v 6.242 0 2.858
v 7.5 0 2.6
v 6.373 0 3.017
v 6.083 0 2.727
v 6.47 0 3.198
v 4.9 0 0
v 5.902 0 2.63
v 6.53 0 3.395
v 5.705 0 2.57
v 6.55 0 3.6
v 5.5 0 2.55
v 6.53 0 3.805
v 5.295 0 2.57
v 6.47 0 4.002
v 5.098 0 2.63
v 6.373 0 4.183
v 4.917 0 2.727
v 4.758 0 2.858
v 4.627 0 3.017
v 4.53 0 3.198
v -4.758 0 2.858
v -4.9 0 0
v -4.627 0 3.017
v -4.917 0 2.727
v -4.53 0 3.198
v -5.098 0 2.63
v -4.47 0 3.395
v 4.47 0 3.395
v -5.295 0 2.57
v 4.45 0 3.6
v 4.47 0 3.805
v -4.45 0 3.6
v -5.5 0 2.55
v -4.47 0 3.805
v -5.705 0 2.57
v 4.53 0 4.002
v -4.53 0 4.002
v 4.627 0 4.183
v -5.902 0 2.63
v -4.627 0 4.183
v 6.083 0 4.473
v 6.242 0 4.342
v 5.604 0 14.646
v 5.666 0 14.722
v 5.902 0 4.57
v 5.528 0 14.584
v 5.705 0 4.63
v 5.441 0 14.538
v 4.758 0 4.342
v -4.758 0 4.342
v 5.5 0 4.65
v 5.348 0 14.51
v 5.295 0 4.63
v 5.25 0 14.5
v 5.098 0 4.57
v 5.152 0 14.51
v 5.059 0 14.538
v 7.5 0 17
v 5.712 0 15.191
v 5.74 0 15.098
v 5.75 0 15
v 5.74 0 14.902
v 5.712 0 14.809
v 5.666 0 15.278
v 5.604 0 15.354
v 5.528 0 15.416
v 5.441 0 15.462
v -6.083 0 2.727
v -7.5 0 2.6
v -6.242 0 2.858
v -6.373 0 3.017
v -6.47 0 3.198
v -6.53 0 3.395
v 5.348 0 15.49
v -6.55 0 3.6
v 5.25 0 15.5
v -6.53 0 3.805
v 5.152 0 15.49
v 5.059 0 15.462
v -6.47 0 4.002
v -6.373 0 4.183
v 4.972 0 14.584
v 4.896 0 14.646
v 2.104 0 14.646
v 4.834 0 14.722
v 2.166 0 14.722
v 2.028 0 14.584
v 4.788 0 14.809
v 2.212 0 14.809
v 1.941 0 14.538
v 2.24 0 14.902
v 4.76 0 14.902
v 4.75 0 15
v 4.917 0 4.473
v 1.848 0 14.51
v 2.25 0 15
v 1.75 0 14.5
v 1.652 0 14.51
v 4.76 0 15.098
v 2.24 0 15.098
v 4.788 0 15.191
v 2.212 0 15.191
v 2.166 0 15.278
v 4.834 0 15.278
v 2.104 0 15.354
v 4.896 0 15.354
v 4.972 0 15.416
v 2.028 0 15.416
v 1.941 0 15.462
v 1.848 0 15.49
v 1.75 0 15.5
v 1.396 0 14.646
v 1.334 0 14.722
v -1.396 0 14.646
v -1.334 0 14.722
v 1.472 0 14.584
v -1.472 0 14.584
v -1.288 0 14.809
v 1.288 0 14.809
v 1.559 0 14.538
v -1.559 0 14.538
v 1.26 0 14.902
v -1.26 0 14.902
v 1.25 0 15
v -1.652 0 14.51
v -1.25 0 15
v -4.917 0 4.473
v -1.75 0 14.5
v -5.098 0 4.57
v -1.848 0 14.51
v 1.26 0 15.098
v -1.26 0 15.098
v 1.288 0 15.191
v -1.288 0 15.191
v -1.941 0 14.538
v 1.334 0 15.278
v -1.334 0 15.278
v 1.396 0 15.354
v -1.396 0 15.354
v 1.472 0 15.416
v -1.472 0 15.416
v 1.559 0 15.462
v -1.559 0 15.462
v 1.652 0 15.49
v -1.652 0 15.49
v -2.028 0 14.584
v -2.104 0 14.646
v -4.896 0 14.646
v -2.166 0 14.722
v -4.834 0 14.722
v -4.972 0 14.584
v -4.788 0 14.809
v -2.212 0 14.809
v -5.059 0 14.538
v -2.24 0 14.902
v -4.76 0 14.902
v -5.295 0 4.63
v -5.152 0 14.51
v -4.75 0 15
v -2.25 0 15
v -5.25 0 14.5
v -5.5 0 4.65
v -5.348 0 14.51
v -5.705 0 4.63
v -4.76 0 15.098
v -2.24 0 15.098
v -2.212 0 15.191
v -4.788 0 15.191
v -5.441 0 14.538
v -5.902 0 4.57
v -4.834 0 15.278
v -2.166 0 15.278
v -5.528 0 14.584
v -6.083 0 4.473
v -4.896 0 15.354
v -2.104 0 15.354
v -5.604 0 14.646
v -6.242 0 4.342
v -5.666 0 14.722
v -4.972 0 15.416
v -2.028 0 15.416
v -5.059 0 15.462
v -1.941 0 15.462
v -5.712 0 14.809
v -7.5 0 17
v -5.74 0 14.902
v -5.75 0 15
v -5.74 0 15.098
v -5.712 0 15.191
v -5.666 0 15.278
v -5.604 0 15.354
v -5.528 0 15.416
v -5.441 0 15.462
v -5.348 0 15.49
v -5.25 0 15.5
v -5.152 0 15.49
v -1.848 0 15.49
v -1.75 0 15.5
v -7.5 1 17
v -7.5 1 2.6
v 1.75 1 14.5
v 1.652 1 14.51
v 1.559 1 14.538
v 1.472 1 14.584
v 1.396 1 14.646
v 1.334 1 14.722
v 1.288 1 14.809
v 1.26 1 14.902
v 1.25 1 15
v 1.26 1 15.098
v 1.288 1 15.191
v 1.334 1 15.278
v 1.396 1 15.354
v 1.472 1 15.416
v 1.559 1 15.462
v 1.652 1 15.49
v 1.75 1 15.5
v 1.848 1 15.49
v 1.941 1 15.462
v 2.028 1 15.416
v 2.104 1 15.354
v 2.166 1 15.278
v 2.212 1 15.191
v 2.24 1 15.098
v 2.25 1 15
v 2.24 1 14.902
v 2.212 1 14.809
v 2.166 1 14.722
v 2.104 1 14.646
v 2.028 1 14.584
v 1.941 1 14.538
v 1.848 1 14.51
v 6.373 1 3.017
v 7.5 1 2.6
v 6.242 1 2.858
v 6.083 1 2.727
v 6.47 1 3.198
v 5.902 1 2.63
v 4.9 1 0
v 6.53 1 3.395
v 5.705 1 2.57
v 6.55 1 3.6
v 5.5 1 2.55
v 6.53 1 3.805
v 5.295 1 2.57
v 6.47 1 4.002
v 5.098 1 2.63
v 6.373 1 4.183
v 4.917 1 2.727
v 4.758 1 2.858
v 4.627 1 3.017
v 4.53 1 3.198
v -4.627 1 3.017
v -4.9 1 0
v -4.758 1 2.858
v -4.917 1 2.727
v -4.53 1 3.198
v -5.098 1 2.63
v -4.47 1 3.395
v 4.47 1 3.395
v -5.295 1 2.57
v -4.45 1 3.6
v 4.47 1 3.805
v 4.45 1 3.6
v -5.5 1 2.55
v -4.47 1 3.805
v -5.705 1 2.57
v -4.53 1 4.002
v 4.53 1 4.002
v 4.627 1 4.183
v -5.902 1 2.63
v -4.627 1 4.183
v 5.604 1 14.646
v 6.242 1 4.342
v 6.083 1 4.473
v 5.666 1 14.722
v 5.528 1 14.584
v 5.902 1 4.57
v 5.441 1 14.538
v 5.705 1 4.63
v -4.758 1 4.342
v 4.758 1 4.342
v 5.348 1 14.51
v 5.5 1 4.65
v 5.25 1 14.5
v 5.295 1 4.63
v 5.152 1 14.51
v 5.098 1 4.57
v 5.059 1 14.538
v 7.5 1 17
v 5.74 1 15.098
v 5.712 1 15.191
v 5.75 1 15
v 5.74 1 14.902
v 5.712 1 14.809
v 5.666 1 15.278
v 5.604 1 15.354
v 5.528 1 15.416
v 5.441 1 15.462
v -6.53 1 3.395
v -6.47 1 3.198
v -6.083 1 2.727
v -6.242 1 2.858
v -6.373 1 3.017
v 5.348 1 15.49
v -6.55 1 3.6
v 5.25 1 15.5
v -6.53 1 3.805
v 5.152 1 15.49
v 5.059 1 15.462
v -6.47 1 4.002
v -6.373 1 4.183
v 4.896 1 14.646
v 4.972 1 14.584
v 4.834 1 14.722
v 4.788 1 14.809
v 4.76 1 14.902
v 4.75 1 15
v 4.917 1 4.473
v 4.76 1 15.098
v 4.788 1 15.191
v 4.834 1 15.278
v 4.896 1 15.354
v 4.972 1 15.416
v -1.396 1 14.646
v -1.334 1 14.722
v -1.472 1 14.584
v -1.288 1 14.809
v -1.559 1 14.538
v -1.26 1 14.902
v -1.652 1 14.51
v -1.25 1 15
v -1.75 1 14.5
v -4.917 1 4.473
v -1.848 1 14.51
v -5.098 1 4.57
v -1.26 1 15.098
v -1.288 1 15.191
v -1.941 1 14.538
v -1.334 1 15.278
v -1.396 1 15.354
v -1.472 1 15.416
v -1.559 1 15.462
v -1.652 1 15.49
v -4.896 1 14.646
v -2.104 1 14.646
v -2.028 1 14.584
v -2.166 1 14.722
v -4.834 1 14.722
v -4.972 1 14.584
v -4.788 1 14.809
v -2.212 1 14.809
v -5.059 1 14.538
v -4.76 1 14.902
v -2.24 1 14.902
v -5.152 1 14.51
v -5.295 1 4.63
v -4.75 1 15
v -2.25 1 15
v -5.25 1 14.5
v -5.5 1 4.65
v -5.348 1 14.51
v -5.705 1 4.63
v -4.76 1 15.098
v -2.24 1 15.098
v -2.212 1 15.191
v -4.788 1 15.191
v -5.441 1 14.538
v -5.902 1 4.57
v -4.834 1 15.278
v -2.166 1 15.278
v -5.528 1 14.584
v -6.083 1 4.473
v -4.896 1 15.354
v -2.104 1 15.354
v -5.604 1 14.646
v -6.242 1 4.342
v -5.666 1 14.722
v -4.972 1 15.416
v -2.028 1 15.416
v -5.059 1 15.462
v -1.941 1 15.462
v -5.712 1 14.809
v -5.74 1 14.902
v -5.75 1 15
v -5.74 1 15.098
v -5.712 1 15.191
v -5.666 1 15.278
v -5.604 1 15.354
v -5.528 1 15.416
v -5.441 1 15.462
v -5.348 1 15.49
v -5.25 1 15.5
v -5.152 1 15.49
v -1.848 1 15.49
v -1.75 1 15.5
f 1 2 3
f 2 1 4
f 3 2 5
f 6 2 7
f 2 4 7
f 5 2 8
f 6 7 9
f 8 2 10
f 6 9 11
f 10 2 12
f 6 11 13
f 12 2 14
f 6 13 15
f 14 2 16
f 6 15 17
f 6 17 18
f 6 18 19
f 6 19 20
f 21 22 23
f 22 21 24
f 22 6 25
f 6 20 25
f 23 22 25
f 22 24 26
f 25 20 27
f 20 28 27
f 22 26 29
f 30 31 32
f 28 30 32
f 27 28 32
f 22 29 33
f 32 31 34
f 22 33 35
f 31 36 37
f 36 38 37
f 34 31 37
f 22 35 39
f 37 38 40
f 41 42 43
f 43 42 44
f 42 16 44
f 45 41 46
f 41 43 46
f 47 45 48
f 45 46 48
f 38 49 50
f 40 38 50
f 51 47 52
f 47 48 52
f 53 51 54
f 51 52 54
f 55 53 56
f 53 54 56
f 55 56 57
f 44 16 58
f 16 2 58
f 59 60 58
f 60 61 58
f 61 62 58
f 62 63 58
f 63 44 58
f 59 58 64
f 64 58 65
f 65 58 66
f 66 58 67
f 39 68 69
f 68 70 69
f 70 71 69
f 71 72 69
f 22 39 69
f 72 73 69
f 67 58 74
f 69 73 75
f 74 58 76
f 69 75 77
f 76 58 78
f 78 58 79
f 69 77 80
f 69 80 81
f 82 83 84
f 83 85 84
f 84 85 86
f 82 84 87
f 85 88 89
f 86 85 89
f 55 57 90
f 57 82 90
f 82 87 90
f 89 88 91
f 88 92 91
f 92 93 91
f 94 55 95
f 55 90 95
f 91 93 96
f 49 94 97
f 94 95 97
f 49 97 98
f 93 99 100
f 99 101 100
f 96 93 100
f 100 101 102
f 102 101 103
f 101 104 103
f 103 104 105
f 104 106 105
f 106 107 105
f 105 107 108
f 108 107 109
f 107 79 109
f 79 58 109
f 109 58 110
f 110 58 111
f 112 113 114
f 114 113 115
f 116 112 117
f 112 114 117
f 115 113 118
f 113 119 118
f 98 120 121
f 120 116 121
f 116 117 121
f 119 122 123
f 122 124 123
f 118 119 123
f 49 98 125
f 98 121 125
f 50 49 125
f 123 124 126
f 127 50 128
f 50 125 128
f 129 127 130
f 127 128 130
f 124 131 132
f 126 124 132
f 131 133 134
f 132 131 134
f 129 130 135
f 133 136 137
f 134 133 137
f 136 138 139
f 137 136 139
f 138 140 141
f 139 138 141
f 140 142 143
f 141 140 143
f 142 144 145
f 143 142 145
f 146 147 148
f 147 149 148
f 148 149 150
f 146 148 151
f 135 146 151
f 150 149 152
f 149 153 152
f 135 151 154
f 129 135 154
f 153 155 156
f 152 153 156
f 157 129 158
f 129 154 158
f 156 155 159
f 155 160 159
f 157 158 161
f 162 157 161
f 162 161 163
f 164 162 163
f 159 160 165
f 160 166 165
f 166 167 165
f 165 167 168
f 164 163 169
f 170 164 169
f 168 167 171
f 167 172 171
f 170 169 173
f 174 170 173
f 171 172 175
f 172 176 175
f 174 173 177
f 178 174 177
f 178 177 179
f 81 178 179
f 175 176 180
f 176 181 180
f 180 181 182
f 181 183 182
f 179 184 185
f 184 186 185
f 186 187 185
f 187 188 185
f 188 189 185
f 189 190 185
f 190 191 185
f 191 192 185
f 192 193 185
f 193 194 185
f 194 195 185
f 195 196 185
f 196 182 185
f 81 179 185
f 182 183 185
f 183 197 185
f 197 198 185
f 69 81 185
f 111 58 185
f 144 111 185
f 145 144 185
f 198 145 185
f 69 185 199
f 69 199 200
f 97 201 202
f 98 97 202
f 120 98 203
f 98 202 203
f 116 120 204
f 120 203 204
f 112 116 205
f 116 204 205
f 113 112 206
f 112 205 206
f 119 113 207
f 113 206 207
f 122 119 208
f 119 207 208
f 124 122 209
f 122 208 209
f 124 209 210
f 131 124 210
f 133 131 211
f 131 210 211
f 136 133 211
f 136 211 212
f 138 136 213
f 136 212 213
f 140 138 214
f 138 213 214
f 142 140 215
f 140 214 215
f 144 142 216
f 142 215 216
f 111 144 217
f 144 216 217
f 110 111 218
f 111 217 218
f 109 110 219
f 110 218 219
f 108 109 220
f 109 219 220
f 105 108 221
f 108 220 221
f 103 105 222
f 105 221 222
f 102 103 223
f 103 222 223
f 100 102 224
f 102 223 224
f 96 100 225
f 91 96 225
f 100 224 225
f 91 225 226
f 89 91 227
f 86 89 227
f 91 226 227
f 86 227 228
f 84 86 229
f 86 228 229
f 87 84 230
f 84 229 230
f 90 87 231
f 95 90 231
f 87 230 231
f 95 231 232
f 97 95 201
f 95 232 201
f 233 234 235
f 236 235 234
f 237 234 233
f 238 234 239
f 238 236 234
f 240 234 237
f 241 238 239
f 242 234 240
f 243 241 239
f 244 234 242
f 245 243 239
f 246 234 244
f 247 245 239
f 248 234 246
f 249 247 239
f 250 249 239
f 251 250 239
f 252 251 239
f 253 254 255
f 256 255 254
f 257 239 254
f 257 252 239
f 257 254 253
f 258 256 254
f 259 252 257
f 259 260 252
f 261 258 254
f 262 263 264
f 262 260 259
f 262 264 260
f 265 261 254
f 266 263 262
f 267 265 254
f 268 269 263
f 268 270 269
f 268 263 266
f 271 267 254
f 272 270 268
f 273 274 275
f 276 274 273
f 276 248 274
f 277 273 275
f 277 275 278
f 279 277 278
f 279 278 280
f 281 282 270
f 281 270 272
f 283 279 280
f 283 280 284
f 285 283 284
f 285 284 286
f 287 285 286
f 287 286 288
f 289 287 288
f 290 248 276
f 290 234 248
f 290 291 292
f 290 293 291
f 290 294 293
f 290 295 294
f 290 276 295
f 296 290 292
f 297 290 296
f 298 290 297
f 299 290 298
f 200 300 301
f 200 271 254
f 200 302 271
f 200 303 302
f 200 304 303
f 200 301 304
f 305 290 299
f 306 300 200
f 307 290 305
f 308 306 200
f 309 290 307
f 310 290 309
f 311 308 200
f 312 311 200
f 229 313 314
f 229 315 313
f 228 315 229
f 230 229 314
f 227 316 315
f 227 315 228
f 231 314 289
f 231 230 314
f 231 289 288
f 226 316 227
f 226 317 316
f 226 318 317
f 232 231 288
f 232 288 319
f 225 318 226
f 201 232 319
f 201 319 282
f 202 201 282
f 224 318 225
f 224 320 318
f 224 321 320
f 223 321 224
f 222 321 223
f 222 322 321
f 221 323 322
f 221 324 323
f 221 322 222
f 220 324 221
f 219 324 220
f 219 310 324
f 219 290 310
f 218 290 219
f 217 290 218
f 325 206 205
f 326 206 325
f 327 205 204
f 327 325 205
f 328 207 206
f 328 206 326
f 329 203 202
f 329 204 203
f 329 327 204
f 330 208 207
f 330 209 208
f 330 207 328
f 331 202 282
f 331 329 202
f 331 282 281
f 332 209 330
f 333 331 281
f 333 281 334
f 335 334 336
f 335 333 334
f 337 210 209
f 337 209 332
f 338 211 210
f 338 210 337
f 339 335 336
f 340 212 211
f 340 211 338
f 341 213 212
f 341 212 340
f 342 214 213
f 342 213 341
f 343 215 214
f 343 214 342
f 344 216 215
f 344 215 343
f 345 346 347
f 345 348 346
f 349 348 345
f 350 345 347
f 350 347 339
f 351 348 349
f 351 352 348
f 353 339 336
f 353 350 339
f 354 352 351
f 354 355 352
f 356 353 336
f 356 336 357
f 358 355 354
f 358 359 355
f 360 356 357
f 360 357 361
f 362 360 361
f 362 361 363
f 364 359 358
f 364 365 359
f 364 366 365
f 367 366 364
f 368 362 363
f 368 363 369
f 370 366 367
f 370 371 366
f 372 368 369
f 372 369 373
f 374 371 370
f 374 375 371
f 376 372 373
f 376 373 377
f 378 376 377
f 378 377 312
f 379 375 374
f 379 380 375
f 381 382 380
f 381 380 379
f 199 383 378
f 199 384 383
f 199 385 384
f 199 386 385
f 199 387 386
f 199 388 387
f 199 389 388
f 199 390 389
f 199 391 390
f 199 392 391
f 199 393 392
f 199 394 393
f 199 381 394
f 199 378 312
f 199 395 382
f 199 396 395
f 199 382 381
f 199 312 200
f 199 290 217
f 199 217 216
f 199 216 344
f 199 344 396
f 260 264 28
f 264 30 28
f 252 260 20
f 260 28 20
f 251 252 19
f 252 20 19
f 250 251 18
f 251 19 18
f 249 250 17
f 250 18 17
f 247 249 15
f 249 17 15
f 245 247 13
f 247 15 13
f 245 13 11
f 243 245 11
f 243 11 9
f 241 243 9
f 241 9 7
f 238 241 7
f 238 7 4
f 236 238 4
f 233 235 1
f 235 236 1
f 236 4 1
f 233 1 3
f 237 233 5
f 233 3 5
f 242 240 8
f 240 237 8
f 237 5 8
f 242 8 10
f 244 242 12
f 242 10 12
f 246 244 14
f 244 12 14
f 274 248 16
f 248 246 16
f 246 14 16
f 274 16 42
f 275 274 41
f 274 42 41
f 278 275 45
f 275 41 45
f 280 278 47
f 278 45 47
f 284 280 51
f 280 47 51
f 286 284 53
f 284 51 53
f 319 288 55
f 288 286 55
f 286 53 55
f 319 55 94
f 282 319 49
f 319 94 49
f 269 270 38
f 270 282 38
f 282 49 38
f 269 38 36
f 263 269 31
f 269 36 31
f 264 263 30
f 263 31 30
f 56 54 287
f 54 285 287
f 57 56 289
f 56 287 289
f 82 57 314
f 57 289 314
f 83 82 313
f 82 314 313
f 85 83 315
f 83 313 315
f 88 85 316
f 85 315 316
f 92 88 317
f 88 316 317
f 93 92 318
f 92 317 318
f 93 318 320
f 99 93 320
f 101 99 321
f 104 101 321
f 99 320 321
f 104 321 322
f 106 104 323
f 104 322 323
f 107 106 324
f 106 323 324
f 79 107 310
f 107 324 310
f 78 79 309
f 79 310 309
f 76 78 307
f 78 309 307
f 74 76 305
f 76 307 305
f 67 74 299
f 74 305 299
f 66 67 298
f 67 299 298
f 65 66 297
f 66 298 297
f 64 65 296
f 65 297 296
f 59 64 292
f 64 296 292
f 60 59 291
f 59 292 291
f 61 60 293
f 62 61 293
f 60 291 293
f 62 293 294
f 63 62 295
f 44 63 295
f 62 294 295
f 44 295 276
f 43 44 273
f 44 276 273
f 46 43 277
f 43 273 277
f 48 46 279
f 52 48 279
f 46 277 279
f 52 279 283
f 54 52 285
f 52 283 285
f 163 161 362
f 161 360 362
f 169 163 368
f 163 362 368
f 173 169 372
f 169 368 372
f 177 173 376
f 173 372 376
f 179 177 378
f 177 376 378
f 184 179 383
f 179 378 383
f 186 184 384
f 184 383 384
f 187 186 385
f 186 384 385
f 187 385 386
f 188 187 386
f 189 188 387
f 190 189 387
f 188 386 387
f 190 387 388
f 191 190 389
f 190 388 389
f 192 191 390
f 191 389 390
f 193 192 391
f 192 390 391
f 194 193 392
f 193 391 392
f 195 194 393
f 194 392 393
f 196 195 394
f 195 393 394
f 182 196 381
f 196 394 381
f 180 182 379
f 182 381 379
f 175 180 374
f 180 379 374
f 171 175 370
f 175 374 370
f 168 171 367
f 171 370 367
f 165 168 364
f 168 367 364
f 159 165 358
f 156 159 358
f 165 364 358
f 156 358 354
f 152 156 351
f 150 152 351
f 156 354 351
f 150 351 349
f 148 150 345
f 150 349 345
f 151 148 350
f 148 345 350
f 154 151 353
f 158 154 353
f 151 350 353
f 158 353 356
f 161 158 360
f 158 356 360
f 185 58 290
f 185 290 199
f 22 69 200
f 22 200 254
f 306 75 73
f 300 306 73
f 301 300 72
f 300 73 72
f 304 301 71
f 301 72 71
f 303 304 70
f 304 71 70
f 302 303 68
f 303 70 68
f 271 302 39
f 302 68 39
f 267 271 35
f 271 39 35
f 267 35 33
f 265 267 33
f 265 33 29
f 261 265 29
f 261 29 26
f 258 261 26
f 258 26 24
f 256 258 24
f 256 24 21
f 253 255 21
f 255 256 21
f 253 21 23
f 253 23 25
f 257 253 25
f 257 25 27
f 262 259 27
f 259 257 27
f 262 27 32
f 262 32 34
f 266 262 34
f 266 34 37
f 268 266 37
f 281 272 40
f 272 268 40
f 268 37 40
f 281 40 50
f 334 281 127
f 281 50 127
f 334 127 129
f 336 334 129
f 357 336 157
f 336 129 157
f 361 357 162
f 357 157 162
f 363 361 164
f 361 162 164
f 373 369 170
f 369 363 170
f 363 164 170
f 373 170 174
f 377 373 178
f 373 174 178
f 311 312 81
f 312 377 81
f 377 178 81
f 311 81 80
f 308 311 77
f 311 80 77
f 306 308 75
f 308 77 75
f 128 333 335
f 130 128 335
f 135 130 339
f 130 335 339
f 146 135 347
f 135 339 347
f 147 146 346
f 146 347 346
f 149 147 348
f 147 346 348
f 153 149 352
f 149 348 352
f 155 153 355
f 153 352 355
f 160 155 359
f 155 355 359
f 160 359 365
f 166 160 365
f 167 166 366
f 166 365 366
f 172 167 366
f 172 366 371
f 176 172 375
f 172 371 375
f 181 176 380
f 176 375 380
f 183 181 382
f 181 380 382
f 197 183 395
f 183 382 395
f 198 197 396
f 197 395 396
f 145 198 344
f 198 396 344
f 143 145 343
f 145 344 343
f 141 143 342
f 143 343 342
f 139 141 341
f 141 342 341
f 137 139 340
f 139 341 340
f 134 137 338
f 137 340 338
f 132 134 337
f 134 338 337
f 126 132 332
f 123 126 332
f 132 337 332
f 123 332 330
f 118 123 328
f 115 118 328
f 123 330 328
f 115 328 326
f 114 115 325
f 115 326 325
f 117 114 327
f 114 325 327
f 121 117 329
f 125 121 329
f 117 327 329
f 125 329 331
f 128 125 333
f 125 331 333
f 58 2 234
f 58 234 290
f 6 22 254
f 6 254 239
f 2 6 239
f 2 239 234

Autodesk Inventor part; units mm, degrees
ref_plane "YZ Plane" through (0, 0, 0) normal (1, 0, 0) x (0, 1, 0)
ref_plane "XZ Plane" through (0, 0, 0) normal (0, 1, 0) x (-1, 0, 0)
ref_plane "XY Plane" through (0, 0, 0) normal (0, 0, 1) x (1, 0, 0)
sketch "Skizze1" plane through (0, 0, 0) normal (0, 1, 0) x (-1, 0, 0)
  line L0 (4.9, 0) -> (-4.9, 0)
  line L1 (-4.9, 0) -> (-7.5, 2.6)
  line L2 (-7.5, 2.6) -> (-7.5, 17)
  line L3 (-7.5, 17) -> (7.5, 17)
  line L4 (7.5, 17) -> (7.5, 2.6)
  line L5 (7.5, 2.6) -> (4.9, 0)
  line L6 (0, -3.4) -> (0, 20.4) projected
  circle A0 centre (5.5, 3.6) radius 1.05
  circle A1 centre (-5.5, 3.6) radius 1.05
  point P0 (0, 0)
  dimension "d0" = 45
  dimension "d1" = 15
  dimension "d2" = 2.6
  dimension "d3" = 17
  dimension "d4" = 2.1
  dimension "d5" = 2.1
  dimension "d6" = 11
  dimension "d7" = 1
extrude "Extrusion1" add sketch "Skizze1" along normal blind 1
fillet "Rundung1" [suppressed]
sketch "Skizze2" plane through (0, 0, 0) normal (0, 1, 0) x (-1, 0, 0)
  line L0 (5.25, 15) -> (-5.25, 15) construction
  line L1 (0, -3) -> (0, 18) projected
  line L2 (-7.35, 0) -> (7.35, 0) projected
  point P0 (0, 0)
  point P1 (1.75, 15)
  point P2 (-1.75, 15)
  dimension "d11" = 3.5
  dimension "d12" = 3.5
  dimension "d13" = 15
hole "Bohrung1" at (1.75, 0, 15) at (-1.75, 0, 15) at (-5.25, 0, 15) at (5.25, 0, 15) direction (0, 1, 0) diameter 1 end through all
equation "\"d12\" = d11"
properties part number "Encoderplatine" material "Phenolharz"
